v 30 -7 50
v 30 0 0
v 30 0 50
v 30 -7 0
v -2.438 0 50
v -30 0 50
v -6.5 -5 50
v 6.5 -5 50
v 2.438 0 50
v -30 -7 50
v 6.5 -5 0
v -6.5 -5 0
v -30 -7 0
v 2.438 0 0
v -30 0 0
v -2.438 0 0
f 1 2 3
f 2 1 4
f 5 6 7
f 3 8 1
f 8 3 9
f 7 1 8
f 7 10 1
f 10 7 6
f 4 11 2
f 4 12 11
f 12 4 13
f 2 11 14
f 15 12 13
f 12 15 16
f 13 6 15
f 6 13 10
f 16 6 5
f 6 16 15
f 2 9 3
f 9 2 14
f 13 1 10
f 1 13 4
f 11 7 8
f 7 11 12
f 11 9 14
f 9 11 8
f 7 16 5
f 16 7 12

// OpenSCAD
difference() {
	union() {
		translate(v = [0, -1.7500000000, 0]) {
			translate(v = [0, 0, 25.0000000000]) {
				cube(center = true, size = [60, 3.5000000000, 50]);
			}
		}
		translate(v = [0, -3.5000000000, 0]) {
			translate(v = [0, -1.7500000000, 0]) {
				translate(v = [0, 0, 25.0000000000]) {
					cube(center = true, size = [60, 3.5000000000, 50]);
				}
			}
		}
	}
	translate(v = [0, -1.0000000000, 0]) {
		translate(v = [0, -4.0000000000, 0]) {
			translate(v = [-6.5000000000, 0, 0]) {
				linear_extrude(height = 50) {
					polygon(points = [[0, 0], [13, 0], [6.5000000000, 8]]);
				}
			}
		}
	}
}
